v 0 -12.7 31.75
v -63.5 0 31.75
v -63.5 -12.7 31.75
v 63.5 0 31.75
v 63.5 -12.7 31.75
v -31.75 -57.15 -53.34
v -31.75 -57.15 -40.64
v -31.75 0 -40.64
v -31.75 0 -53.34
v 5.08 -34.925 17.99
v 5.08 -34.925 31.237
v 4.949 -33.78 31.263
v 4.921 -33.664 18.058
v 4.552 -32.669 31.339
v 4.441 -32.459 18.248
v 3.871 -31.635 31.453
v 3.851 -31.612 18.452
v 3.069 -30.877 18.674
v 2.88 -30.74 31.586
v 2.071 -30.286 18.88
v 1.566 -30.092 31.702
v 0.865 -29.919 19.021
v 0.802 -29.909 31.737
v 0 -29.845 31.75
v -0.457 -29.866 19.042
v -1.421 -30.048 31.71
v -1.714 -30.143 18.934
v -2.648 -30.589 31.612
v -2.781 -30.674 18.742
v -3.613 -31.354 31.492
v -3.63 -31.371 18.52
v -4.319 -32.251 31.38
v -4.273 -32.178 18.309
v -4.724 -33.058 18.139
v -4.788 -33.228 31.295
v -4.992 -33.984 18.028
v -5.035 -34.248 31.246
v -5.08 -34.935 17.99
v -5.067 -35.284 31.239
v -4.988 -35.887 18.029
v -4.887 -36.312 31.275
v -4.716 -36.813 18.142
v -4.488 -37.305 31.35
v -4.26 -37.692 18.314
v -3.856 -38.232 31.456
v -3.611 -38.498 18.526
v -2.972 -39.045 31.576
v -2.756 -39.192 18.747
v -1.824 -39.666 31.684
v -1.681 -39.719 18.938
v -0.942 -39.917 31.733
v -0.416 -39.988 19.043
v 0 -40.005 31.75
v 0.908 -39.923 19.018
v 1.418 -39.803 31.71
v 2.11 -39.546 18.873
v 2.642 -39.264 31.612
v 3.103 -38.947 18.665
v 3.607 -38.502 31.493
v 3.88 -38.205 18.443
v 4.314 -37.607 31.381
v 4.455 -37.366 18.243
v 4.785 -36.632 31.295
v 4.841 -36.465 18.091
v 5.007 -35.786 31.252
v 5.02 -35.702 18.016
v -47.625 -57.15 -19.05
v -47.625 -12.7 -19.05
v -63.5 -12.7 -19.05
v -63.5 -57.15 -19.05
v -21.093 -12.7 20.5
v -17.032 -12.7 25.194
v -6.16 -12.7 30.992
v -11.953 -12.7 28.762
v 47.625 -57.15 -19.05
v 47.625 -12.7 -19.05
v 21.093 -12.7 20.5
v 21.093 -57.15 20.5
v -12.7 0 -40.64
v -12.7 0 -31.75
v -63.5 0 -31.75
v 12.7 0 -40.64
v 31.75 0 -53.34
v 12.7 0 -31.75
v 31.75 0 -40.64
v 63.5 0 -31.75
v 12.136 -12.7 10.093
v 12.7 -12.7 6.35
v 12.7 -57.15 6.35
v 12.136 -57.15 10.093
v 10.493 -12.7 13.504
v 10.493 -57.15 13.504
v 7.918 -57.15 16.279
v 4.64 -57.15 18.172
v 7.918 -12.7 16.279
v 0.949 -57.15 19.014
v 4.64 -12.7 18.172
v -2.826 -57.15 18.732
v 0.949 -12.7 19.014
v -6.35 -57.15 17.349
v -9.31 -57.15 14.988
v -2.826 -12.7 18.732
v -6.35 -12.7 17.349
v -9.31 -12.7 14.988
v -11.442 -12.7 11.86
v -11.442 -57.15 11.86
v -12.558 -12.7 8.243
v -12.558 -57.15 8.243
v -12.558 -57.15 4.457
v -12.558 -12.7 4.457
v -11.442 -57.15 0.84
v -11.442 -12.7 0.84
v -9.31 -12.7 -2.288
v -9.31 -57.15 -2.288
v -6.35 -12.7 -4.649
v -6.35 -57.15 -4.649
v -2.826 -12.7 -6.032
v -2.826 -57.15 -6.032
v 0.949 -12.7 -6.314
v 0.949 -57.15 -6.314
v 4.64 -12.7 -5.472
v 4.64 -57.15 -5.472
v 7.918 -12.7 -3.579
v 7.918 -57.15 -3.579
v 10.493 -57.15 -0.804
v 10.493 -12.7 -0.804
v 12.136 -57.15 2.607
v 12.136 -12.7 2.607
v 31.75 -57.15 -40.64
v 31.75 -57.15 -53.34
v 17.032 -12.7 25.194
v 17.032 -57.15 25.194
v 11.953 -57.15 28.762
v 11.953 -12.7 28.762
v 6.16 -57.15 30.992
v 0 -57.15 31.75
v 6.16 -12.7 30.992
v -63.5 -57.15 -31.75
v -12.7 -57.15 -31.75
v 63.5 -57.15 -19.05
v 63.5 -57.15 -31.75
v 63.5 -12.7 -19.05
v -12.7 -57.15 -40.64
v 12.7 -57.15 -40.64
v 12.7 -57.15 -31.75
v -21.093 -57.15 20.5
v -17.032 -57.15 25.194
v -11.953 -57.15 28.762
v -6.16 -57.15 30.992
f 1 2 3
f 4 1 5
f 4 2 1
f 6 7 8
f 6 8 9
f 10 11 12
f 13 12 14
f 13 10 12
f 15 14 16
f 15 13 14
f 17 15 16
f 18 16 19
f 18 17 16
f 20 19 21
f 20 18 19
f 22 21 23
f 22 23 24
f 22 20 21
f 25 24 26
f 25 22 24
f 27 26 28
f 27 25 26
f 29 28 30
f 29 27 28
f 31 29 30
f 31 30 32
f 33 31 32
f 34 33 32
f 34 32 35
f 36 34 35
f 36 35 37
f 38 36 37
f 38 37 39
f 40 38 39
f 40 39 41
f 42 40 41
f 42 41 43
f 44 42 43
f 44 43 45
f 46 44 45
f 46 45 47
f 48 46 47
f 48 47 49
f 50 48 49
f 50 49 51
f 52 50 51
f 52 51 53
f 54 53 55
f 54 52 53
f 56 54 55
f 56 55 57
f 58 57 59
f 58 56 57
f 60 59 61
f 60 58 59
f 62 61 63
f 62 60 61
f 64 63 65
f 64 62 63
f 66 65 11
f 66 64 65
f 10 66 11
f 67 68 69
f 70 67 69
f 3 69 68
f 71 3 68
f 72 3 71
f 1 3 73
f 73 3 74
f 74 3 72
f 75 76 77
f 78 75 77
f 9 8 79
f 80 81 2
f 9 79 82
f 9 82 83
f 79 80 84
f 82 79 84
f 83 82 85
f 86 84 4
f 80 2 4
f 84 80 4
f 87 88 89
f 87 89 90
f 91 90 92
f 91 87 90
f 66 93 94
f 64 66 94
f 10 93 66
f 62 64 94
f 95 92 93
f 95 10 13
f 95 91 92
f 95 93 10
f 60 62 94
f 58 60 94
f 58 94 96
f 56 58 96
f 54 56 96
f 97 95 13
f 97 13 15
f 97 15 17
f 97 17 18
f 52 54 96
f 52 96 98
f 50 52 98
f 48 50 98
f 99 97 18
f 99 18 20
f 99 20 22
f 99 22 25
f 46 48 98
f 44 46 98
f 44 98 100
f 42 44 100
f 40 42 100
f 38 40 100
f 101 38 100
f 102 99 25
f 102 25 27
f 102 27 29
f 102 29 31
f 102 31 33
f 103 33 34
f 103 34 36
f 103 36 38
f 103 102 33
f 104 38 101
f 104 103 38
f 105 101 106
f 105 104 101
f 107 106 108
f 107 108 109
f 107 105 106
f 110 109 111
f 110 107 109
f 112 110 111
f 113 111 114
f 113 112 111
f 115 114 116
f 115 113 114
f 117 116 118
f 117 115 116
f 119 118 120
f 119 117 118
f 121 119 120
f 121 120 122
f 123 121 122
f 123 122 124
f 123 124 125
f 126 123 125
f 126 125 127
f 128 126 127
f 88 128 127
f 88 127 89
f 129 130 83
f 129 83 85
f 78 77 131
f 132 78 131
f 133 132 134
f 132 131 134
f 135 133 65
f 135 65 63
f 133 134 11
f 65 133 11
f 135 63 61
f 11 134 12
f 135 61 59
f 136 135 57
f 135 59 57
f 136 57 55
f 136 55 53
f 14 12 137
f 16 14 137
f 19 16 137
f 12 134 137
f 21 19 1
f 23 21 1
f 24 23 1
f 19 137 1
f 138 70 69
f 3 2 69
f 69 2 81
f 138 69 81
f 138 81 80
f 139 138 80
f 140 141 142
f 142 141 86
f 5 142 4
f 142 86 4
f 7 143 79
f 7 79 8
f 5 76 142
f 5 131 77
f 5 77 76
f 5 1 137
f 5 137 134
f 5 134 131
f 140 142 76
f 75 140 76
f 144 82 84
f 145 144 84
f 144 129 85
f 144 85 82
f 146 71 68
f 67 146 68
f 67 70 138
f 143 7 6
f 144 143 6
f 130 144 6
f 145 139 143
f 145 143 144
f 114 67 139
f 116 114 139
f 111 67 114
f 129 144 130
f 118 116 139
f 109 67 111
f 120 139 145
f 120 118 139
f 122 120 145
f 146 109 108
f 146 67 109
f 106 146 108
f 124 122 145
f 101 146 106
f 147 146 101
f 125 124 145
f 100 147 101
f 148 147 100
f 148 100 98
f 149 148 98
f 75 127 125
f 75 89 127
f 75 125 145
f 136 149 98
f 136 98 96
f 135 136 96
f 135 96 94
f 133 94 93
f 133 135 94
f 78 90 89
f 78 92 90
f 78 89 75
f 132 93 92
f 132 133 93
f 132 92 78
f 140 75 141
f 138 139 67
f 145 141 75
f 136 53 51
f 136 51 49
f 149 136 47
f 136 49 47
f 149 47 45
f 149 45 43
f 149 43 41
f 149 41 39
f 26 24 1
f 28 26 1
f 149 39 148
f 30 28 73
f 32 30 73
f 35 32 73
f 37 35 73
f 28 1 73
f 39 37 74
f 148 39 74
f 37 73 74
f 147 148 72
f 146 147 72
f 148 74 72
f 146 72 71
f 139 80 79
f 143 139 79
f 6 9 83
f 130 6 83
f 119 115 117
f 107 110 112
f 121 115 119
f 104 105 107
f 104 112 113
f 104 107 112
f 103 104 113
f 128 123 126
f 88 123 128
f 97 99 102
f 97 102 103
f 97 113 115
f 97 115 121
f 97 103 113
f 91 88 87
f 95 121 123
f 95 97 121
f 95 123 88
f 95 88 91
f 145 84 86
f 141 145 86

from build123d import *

# Parameters (mm, degrees)
F0_W     = 127
F0_H     = 63.5
F1_DEPTH = 12.7
F2_R     = 12.7
F3_DEPTH = 44.45
F5_DEPTH = 57.15
F7_R     = 5.08
F8_DEPTH = 25.4


with BuildPart() as f1:
    # F0 (on Front) → F1 (new body)
    with BuildSketch(Plane.XZ):
        Rectangle(F0_W, F0_H)
    extrude(amount=F1_DEPTH)

    # F2 (on face) → F3 (join)
    with BuildSketch(Plane.XZ.offset(12.7)):
        with BuildLine():
            Line((-63.5, -19.05), (-63.5, -31.75))
            Line((-63.5, -31.75), (63.5, -31.75))
            Line((63.5, -31.75), (63.5, -19.05))
            Line((63.5, -19.05), (47.625, -19.05))
            Line((47.625, -19.05), (21.0934256055, 20.5001730104))
            ThreePointArc((21.0934256055, 20.5001730104), (11.9529411765, 28.7617647059), (0, 31.75))
            ThreePointArc((0, 31.75), (-11.9529411765, 28.7617647059), (-21.0934256055, 20.5001730104))
            Line((-21.0934256055, 20.5001730104), (-47.625, -19.05))
            Line((-47.625, -19.05), (-63.5, -19.05))
        make_face()
        with Locations((0, 6.35)):
            Circle(F2_R, mode=Mode.SUBTRACT)
    extrude(amount=F3_DEPTH)

    # F4 (on Front) → F5 (join)
    with BuildSketch(Plane.XZ):
        Polygon((12.7, -31.75), (-12.7, -31.75), (-12.7, -40.64), (-31.75, -40.64), (-31.75, -53.34), (31.75, -53.34), (31.75, -40.64), (12.7, -40.64), align=None)
    extrude(amount=F5_DEPTH)

    # F7 (on offset) → F8 (cut)
    with BuildSketch(Plane.XY.offset(6.35)):
        with Locations((0, -34.925)):
            Circle(F7_R)
    extrude(amount=F8_DEPTH, mode=Mode.SUBTRACT)


solid = f1.part
